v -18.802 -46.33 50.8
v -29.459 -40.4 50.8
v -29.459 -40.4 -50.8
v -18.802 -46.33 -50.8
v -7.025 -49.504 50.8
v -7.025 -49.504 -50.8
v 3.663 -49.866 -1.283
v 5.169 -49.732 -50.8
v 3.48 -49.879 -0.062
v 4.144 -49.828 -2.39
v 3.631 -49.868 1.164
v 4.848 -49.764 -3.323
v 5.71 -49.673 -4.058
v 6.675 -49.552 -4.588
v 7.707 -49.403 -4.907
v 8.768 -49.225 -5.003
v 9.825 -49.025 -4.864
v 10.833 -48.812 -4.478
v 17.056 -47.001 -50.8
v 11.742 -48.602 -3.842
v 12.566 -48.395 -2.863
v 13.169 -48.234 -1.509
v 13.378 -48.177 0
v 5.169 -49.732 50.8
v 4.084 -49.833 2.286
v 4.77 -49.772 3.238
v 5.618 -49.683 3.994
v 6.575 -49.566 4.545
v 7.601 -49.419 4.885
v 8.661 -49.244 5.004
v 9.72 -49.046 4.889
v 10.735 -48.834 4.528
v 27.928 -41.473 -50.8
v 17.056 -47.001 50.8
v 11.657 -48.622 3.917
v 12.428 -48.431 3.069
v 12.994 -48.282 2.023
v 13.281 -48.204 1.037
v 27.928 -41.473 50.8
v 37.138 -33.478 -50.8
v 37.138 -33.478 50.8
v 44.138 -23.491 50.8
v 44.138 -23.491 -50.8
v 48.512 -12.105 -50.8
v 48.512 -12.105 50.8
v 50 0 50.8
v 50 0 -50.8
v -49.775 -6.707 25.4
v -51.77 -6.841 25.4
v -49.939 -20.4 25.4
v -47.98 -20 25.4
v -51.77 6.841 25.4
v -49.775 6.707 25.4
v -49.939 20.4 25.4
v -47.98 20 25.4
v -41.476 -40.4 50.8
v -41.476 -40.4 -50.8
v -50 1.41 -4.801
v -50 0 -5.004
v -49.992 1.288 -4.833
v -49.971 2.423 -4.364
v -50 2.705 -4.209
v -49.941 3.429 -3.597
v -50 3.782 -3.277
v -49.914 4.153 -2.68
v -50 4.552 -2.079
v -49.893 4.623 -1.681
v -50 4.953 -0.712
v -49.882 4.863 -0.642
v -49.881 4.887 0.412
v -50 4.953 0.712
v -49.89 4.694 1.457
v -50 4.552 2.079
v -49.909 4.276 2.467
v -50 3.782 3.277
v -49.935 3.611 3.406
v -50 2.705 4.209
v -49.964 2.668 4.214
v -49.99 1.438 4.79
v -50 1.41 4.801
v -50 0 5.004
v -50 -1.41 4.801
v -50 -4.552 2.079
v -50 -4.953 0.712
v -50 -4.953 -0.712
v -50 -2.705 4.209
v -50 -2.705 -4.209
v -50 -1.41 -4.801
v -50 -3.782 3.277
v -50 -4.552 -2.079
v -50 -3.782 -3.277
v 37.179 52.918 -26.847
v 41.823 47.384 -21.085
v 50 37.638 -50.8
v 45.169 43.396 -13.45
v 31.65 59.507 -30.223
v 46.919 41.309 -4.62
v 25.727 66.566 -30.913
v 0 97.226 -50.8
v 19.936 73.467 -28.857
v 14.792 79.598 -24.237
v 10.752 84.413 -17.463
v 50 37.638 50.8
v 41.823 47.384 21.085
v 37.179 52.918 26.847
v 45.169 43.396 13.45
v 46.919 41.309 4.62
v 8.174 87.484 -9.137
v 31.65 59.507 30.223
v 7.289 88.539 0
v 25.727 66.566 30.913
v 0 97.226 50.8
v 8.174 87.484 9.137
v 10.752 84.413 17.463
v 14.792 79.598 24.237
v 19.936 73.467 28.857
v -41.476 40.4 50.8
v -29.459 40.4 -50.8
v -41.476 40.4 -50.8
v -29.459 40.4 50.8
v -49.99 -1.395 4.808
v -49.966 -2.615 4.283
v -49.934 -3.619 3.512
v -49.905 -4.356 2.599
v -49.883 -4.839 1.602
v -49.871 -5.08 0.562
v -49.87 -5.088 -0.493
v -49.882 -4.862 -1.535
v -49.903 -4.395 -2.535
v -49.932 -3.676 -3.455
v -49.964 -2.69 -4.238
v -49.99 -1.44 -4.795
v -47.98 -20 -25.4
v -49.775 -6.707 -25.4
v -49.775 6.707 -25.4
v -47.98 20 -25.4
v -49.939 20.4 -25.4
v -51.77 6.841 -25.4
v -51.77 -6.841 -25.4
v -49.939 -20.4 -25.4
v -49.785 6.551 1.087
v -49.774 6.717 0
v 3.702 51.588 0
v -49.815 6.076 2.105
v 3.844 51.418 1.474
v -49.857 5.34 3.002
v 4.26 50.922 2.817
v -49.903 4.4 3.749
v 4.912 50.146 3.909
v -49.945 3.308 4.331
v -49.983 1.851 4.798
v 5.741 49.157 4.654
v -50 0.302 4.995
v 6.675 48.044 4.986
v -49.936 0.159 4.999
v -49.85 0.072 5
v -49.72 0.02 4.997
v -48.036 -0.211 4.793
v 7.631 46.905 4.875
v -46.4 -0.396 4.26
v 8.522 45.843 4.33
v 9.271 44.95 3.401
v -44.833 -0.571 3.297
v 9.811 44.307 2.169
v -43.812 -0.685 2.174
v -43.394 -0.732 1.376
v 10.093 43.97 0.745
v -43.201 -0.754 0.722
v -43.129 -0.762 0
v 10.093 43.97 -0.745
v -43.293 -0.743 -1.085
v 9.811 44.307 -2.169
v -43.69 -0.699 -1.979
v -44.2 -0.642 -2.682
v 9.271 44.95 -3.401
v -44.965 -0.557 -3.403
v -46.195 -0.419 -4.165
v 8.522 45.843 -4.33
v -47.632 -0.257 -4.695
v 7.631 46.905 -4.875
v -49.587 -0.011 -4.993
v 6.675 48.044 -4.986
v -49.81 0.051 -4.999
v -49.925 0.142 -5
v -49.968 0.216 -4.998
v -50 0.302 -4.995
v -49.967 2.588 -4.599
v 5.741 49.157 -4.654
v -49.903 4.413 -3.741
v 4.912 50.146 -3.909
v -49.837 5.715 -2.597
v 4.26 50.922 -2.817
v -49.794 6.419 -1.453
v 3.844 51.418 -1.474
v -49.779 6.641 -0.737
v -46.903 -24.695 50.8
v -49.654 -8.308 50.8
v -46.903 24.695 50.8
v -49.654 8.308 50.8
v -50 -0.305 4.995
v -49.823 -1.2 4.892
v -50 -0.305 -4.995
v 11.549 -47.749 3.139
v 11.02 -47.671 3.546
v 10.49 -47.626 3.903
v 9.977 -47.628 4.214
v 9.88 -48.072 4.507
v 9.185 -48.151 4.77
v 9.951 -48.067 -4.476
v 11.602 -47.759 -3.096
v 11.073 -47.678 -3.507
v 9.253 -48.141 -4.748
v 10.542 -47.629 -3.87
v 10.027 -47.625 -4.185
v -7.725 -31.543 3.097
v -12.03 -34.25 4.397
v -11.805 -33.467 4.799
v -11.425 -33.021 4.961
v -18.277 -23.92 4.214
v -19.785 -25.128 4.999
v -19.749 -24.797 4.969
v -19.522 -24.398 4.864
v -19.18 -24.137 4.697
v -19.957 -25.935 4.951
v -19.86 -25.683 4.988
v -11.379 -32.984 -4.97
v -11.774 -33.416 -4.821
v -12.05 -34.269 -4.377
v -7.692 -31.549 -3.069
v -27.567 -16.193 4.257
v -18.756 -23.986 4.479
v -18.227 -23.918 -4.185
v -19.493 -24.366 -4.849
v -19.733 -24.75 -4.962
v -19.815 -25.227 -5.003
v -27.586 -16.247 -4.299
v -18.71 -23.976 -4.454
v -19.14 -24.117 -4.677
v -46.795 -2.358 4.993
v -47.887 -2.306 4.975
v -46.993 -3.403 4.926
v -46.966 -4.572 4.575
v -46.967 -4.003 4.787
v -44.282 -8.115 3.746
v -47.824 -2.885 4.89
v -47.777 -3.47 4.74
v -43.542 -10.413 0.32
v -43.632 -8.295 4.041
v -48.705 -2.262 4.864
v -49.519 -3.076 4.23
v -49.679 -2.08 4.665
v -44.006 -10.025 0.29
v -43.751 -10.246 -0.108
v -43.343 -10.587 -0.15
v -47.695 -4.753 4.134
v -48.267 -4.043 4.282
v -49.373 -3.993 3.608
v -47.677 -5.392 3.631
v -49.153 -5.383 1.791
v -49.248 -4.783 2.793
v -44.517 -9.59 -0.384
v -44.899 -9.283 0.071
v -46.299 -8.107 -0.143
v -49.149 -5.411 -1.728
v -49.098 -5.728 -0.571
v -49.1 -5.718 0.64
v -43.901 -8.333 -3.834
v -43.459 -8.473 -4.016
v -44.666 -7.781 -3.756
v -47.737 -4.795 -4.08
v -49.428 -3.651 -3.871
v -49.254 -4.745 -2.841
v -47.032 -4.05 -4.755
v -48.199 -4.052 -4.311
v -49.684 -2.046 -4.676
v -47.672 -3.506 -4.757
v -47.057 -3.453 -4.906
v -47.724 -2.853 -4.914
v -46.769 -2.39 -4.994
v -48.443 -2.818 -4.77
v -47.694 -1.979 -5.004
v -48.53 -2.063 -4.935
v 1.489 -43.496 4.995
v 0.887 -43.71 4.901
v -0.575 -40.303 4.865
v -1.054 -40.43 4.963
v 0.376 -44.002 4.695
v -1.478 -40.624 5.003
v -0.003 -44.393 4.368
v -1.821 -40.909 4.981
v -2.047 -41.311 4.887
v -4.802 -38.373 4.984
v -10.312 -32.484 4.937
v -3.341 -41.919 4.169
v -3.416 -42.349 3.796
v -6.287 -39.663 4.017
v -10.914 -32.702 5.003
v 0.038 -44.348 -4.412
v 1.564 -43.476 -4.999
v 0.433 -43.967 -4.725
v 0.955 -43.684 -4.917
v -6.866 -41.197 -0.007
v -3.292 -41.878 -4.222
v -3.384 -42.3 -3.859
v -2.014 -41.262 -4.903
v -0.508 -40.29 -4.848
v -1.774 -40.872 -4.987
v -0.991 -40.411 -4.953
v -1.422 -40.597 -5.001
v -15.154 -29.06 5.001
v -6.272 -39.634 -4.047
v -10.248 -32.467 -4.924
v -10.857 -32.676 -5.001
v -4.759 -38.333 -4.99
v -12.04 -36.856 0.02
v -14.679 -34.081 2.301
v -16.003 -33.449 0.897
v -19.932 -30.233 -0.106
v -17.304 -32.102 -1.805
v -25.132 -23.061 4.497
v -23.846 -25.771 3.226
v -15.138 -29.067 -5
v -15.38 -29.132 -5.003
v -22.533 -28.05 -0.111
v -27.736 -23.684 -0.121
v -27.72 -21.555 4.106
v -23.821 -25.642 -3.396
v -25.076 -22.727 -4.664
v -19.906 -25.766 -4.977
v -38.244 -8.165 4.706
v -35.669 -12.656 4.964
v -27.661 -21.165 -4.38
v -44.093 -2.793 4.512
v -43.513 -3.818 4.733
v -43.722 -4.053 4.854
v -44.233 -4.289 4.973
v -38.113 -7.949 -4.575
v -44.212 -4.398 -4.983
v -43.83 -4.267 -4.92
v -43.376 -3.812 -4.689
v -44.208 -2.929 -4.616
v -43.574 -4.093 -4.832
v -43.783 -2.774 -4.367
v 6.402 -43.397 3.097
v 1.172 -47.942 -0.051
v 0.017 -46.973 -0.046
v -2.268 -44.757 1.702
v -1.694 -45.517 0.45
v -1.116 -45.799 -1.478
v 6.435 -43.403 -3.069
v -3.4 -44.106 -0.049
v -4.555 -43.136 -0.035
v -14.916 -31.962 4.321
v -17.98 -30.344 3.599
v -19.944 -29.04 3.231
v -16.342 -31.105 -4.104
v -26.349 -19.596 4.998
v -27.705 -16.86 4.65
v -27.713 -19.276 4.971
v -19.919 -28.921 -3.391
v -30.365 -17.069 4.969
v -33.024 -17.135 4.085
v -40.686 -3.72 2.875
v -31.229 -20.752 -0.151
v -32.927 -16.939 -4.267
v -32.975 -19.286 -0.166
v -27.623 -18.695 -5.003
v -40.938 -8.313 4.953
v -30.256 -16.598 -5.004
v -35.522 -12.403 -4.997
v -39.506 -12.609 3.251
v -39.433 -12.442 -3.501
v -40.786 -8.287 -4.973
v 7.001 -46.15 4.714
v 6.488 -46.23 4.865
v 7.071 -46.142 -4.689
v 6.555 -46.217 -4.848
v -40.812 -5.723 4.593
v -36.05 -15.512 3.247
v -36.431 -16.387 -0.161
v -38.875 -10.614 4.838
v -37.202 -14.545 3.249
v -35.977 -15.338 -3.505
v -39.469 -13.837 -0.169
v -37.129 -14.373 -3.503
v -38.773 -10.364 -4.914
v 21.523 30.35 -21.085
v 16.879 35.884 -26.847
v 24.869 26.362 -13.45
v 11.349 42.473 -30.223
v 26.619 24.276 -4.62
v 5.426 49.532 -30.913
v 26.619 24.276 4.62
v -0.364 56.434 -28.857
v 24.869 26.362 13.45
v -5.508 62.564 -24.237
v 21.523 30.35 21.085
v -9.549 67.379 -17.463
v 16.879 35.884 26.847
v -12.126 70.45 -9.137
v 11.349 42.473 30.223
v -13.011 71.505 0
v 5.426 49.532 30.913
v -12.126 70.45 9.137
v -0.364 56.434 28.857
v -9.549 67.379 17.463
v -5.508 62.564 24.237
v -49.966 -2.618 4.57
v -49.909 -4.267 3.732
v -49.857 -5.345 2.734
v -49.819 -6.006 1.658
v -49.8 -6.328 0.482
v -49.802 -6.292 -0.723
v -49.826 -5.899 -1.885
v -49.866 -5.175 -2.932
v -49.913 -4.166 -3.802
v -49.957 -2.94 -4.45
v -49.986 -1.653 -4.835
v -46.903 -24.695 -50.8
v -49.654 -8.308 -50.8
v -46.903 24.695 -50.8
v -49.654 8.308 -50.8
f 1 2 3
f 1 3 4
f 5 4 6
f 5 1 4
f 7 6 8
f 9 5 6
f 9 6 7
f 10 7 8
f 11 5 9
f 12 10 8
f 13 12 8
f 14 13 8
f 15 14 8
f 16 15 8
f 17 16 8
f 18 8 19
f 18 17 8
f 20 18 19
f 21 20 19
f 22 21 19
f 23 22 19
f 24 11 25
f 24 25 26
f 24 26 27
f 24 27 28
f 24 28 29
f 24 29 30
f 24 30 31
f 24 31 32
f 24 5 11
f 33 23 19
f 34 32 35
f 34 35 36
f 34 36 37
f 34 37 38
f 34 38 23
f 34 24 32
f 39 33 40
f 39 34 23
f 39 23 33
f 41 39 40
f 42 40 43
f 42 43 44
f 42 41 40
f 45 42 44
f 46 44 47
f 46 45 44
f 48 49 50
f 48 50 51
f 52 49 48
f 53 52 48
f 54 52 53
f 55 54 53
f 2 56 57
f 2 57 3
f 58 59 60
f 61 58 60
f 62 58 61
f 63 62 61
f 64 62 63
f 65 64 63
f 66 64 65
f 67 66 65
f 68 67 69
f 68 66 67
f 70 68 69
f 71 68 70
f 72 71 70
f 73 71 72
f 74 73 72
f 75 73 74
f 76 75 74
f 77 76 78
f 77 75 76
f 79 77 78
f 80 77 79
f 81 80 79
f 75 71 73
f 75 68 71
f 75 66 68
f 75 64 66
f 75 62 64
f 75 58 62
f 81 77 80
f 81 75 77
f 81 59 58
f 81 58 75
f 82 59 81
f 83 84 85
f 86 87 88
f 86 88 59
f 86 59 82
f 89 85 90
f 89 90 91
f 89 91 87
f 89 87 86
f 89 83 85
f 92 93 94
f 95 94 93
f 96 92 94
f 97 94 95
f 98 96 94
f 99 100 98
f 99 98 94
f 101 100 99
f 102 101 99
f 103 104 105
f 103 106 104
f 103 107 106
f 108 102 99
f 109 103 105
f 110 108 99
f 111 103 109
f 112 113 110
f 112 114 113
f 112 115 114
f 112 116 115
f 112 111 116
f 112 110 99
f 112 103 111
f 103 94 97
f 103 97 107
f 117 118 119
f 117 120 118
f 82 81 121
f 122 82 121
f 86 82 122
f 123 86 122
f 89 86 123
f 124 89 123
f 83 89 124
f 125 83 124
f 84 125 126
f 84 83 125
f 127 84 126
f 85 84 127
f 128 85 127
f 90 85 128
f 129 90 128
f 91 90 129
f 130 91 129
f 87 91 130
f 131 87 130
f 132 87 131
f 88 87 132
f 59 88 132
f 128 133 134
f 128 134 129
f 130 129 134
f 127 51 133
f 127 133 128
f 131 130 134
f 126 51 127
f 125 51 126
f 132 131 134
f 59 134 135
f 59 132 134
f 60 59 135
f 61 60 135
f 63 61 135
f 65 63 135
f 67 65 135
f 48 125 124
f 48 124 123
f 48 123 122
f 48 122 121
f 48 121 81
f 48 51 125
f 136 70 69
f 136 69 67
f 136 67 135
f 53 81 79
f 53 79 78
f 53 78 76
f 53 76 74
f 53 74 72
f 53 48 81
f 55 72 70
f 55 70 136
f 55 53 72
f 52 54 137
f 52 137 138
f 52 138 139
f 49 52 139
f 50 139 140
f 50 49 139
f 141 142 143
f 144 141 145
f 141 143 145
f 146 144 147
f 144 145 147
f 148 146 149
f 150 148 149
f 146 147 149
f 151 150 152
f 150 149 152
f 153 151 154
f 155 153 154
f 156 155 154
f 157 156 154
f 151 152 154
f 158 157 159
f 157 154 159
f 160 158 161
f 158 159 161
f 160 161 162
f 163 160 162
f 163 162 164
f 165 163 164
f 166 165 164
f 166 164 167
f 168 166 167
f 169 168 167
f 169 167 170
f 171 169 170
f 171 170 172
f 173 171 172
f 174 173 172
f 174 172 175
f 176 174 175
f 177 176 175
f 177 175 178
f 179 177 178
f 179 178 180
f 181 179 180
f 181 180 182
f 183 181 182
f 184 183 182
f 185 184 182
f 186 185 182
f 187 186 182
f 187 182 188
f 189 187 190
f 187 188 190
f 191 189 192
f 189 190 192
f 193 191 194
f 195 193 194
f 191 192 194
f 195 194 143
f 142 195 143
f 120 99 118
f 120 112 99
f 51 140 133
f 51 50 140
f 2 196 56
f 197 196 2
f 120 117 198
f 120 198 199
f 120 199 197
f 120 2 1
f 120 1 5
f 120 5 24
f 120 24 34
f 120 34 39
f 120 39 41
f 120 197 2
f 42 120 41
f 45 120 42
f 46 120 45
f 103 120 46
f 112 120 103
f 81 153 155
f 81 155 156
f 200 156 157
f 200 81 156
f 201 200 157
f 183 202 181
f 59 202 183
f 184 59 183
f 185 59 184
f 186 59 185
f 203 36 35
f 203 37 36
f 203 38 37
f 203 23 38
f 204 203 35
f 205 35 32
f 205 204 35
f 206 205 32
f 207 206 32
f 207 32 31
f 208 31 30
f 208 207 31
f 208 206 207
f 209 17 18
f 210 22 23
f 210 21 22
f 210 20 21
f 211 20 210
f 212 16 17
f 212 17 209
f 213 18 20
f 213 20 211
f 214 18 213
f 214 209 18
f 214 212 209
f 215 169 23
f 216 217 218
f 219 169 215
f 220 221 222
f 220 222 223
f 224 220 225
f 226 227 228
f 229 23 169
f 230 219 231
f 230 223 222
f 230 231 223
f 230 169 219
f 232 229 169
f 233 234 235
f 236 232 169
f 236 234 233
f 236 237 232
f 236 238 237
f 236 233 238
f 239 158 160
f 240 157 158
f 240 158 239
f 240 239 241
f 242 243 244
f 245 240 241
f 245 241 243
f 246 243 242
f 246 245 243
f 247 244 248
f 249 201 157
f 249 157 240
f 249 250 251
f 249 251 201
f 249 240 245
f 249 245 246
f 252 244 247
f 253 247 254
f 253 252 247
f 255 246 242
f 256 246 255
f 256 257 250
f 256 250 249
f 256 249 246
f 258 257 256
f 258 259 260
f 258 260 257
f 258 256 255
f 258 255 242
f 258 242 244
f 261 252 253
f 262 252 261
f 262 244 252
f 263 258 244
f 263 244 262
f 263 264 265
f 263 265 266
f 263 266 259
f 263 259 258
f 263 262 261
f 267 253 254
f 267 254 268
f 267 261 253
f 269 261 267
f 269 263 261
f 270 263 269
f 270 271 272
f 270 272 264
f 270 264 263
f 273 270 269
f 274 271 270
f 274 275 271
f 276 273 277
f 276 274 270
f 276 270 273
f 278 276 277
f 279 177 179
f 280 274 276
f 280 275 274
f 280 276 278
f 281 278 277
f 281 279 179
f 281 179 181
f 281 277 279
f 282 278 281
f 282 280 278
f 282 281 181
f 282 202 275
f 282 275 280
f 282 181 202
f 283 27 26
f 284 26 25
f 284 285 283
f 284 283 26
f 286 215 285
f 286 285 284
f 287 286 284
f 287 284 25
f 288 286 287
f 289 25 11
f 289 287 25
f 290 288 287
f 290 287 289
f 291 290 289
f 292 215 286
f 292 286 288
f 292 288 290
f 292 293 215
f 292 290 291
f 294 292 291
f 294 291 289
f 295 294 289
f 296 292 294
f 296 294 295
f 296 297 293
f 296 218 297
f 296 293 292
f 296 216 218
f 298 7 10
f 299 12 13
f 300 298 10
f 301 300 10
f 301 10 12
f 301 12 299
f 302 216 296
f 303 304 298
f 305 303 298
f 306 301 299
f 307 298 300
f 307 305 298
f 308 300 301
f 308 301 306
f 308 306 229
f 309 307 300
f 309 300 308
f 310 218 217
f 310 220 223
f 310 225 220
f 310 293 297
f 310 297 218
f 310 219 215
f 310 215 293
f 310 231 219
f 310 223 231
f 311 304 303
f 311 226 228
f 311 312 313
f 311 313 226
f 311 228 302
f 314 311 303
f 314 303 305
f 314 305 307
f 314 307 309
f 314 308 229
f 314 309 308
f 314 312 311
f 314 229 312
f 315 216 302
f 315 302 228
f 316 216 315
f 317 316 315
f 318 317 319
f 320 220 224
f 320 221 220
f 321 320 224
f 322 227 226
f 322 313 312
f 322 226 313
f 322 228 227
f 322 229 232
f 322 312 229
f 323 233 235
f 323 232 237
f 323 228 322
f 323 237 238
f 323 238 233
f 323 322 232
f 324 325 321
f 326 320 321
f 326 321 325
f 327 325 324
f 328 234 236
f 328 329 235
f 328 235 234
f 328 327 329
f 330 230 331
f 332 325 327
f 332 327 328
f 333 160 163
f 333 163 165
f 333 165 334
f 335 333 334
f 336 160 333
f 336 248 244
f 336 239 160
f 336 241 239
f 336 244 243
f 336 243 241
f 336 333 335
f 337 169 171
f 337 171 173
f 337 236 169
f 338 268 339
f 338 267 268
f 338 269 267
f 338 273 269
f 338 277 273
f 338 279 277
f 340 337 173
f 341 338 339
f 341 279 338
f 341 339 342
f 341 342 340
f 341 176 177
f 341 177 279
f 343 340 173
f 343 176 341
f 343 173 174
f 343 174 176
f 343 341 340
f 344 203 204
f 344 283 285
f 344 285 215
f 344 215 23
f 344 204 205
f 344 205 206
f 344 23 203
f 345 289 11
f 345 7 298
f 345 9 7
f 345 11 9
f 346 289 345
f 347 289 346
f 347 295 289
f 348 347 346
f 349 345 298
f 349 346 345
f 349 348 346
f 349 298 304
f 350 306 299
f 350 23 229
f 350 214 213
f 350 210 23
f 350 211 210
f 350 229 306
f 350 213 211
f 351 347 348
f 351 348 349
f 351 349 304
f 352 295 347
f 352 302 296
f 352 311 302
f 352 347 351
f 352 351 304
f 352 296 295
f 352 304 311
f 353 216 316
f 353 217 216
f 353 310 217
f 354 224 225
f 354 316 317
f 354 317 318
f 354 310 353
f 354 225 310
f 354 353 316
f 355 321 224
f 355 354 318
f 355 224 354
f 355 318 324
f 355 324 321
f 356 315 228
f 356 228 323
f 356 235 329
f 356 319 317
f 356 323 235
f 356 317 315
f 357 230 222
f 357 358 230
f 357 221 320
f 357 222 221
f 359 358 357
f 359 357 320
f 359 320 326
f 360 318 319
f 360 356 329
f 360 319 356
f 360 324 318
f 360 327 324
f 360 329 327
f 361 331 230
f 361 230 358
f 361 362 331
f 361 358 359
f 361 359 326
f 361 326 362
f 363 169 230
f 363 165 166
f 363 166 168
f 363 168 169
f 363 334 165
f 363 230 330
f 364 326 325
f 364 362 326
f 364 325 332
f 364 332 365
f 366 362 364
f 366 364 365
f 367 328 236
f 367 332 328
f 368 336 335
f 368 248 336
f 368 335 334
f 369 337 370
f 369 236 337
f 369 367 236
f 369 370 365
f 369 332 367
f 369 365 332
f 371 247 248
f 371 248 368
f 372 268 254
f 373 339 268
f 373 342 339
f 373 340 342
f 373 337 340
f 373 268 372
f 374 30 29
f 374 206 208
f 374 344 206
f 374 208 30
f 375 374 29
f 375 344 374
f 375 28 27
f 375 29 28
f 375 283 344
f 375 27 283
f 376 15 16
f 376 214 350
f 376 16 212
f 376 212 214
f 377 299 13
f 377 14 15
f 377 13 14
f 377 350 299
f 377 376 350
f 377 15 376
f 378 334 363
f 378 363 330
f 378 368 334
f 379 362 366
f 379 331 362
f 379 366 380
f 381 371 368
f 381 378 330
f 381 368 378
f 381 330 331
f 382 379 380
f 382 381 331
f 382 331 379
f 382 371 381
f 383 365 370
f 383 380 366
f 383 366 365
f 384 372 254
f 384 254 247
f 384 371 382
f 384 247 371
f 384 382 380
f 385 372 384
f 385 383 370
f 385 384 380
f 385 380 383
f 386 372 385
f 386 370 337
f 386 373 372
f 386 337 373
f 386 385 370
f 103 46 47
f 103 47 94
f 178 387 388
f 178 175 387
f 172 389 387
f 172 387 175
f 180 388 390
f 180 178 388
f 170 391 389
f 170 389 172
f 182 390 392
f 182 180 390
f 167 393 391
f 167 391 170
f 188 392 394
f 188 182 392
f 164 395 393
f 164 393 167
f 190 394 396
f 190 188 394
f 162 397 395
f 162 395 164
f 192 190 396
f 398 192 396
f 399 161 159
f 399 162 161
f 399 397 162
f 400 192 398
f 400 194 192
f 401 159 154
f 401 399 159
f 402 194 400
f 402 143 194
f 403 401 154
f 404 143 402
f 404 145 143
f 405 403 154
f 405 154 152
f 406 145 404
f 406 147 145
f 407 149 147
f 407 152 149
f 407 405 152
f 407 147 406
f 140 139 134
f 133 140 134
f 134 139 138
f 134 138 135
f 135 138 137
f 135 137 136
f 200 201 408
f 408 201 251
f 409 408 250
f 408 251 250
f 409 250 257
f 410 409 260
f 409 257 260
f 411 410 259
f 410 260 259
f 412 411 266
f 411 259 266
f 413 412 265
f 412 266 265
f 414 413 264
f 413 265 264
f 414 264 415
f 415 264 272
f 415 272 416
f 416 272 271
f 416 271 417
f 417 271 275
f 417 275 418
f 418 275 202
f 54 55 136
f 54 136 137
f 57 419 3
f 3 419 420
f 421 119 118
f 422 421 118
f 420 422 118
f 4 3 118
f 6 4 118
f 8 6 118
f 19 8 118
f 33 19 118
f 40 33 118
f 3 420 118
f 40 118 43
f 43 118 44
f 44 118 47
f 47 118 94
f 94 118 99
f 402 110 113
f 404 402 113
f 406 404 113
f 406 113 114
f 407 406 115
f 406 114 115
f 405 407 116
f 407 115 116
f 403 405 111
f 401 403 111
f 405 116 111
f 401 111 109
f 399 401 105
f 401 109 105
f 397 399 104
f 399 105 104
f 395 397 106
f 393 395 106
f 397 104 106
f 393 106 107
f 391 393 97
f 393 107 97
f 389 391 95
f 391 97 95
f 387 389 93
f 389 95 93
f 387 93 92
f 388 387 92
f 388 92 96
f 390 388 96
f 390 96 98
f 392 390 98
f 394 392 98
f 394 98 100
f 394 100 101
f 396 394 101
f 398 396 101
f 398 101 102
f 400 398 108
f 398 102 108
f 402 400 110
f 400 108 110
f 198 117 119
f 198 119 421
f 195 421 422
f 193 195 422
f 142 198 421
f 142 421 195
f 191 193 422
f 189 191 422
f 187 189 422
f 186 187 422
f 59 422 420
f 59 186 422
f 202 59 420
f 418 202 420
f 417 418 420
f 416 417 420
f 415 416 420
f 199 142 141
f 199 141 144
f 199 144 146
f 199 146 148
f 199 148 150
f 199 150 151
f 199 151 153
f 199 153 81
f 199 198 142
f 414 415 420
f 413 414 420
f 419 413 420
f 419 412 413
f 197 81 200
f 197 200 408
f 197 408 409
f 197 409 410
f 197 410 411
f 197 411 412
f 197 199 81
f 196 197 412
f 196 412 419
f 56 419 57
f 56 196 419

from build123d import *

# Parameters (mm, degrees)
F2_DEPTH      = 25.4
F2_DEPTH_BACK = 25.4
F4_DEPTH      = 50.8
F4_DEPTH_BACK = 50.8
F5_R          = 5
F6_DEPTH      = 127
F7_R          = 31
F8_DEPTH      = 26.5
F9_R          = 5.0038


with BuildPart() as f2:
    # F1 (on Top) → F2 (new body, two sides)
    with BuildSketch(Plane.XY) as f2_sk:
        with BuildLine():
            ThreePointArc((-47.9795897113, -20), (-50, 0), (-47.9795897113, 20))
            Line((-47.9795897113, 20), (-49.9391815056, 20.4))
            ThreePointArc((-49.9391815056, 20.4), (-52, 0), (-49.9391815056, -20.4))
            Line((-49.9391815056, -20.4), (-47.9795897113, -20))
        make_face()
    extrude(amount=F2_DEPTH)
    extrude(f2_sk.sketch, amount=-F2_DEPTH_BACK)


with BuildPart() as f4:
    # F3 (on Top) → F4 (new body, two sides)
    with BuildSketch(Plane.XY) as f4_sk:
        with BuildLine():
            Line((-29.4591242232, 40.4), (-41.4758984651, 40.4))
            ThreePointArc((-41.4758984651, 40.4), (-50, 0), (-41.4758984651, -40.4))
            Line((-41.4758984651, -40.4), (-29.4591242232, -40.4))
            ThreePointArc((-29.4591242232, -40.4), (22.6610214778, -44.569923778), (50, 0))
            Line((50, 0), (50, 37.638230517))
            Line((50, 37.638230517), (0, 97.2259101467))
            Line((0, 97.2259101467), (-29.4591242232, 40.4))
        make_face()
    extrude(amount=F4_DEPTH)
    extrude(f4_sk.sketch, amount=-F4_DEPTH_BACK)

    # F5 (on face) → F6 (cut)
    with BuildSketch(Plane(origin=(47.8744150531, 40.1714040139, 0), x_dir=(-0.6427876097, 0.7660444431, 0), z_dir=(0.7660444431, 0.6427876097, 0))):
        with Locations((32.1393804843, 0)):
            Circle(F5_R)
    extrude(amount=-F6_DEPTH, mode=Mode.SUBTRACT)

    # F7 (on face) → F8 (cut)
    with BuildSketch(Plane(origin=(47.8744150531, 40.1714040139, 0), x_dir=(-0.6427876097, 0.7660444431, 0), z_dir=(0.7660444431, 0.6427876097, 0))):
        with Locations((32.1393804843, 0)):
            Circle(F7_R)
    extrude(amount=-F8_DEPTH, mode=Mode.SUBTRACT)


with BuildPart() as f10_tool:
    # F10: sweep along a path in F0
    with BuildLine(Plane.XY) as f10_path:
        Line((47.5974665938, -81.8939982227), (-50, 0))
    # F9 (on Right) → F10 (sweep)
    with BuildSketch(Plane.YZ):
        with Locations((-41.9549815589, 0)):
            Circle(F9_R)
    sweep(path=f10_path.line)


with BuildPart() as f2_1:
    add(f2.part)

    # F10: cut by f10_tool
    add(f10_tool.part, mode=Mode.SUBTRACT)


with BuildPart() as f4_1:
    add(f4.part)

    # F10: cut by f10_tool
    add(f10_tool.part, mode=Mode.SUBTRACT)


solid = Compound([f2_1.part, f4_1.part])
